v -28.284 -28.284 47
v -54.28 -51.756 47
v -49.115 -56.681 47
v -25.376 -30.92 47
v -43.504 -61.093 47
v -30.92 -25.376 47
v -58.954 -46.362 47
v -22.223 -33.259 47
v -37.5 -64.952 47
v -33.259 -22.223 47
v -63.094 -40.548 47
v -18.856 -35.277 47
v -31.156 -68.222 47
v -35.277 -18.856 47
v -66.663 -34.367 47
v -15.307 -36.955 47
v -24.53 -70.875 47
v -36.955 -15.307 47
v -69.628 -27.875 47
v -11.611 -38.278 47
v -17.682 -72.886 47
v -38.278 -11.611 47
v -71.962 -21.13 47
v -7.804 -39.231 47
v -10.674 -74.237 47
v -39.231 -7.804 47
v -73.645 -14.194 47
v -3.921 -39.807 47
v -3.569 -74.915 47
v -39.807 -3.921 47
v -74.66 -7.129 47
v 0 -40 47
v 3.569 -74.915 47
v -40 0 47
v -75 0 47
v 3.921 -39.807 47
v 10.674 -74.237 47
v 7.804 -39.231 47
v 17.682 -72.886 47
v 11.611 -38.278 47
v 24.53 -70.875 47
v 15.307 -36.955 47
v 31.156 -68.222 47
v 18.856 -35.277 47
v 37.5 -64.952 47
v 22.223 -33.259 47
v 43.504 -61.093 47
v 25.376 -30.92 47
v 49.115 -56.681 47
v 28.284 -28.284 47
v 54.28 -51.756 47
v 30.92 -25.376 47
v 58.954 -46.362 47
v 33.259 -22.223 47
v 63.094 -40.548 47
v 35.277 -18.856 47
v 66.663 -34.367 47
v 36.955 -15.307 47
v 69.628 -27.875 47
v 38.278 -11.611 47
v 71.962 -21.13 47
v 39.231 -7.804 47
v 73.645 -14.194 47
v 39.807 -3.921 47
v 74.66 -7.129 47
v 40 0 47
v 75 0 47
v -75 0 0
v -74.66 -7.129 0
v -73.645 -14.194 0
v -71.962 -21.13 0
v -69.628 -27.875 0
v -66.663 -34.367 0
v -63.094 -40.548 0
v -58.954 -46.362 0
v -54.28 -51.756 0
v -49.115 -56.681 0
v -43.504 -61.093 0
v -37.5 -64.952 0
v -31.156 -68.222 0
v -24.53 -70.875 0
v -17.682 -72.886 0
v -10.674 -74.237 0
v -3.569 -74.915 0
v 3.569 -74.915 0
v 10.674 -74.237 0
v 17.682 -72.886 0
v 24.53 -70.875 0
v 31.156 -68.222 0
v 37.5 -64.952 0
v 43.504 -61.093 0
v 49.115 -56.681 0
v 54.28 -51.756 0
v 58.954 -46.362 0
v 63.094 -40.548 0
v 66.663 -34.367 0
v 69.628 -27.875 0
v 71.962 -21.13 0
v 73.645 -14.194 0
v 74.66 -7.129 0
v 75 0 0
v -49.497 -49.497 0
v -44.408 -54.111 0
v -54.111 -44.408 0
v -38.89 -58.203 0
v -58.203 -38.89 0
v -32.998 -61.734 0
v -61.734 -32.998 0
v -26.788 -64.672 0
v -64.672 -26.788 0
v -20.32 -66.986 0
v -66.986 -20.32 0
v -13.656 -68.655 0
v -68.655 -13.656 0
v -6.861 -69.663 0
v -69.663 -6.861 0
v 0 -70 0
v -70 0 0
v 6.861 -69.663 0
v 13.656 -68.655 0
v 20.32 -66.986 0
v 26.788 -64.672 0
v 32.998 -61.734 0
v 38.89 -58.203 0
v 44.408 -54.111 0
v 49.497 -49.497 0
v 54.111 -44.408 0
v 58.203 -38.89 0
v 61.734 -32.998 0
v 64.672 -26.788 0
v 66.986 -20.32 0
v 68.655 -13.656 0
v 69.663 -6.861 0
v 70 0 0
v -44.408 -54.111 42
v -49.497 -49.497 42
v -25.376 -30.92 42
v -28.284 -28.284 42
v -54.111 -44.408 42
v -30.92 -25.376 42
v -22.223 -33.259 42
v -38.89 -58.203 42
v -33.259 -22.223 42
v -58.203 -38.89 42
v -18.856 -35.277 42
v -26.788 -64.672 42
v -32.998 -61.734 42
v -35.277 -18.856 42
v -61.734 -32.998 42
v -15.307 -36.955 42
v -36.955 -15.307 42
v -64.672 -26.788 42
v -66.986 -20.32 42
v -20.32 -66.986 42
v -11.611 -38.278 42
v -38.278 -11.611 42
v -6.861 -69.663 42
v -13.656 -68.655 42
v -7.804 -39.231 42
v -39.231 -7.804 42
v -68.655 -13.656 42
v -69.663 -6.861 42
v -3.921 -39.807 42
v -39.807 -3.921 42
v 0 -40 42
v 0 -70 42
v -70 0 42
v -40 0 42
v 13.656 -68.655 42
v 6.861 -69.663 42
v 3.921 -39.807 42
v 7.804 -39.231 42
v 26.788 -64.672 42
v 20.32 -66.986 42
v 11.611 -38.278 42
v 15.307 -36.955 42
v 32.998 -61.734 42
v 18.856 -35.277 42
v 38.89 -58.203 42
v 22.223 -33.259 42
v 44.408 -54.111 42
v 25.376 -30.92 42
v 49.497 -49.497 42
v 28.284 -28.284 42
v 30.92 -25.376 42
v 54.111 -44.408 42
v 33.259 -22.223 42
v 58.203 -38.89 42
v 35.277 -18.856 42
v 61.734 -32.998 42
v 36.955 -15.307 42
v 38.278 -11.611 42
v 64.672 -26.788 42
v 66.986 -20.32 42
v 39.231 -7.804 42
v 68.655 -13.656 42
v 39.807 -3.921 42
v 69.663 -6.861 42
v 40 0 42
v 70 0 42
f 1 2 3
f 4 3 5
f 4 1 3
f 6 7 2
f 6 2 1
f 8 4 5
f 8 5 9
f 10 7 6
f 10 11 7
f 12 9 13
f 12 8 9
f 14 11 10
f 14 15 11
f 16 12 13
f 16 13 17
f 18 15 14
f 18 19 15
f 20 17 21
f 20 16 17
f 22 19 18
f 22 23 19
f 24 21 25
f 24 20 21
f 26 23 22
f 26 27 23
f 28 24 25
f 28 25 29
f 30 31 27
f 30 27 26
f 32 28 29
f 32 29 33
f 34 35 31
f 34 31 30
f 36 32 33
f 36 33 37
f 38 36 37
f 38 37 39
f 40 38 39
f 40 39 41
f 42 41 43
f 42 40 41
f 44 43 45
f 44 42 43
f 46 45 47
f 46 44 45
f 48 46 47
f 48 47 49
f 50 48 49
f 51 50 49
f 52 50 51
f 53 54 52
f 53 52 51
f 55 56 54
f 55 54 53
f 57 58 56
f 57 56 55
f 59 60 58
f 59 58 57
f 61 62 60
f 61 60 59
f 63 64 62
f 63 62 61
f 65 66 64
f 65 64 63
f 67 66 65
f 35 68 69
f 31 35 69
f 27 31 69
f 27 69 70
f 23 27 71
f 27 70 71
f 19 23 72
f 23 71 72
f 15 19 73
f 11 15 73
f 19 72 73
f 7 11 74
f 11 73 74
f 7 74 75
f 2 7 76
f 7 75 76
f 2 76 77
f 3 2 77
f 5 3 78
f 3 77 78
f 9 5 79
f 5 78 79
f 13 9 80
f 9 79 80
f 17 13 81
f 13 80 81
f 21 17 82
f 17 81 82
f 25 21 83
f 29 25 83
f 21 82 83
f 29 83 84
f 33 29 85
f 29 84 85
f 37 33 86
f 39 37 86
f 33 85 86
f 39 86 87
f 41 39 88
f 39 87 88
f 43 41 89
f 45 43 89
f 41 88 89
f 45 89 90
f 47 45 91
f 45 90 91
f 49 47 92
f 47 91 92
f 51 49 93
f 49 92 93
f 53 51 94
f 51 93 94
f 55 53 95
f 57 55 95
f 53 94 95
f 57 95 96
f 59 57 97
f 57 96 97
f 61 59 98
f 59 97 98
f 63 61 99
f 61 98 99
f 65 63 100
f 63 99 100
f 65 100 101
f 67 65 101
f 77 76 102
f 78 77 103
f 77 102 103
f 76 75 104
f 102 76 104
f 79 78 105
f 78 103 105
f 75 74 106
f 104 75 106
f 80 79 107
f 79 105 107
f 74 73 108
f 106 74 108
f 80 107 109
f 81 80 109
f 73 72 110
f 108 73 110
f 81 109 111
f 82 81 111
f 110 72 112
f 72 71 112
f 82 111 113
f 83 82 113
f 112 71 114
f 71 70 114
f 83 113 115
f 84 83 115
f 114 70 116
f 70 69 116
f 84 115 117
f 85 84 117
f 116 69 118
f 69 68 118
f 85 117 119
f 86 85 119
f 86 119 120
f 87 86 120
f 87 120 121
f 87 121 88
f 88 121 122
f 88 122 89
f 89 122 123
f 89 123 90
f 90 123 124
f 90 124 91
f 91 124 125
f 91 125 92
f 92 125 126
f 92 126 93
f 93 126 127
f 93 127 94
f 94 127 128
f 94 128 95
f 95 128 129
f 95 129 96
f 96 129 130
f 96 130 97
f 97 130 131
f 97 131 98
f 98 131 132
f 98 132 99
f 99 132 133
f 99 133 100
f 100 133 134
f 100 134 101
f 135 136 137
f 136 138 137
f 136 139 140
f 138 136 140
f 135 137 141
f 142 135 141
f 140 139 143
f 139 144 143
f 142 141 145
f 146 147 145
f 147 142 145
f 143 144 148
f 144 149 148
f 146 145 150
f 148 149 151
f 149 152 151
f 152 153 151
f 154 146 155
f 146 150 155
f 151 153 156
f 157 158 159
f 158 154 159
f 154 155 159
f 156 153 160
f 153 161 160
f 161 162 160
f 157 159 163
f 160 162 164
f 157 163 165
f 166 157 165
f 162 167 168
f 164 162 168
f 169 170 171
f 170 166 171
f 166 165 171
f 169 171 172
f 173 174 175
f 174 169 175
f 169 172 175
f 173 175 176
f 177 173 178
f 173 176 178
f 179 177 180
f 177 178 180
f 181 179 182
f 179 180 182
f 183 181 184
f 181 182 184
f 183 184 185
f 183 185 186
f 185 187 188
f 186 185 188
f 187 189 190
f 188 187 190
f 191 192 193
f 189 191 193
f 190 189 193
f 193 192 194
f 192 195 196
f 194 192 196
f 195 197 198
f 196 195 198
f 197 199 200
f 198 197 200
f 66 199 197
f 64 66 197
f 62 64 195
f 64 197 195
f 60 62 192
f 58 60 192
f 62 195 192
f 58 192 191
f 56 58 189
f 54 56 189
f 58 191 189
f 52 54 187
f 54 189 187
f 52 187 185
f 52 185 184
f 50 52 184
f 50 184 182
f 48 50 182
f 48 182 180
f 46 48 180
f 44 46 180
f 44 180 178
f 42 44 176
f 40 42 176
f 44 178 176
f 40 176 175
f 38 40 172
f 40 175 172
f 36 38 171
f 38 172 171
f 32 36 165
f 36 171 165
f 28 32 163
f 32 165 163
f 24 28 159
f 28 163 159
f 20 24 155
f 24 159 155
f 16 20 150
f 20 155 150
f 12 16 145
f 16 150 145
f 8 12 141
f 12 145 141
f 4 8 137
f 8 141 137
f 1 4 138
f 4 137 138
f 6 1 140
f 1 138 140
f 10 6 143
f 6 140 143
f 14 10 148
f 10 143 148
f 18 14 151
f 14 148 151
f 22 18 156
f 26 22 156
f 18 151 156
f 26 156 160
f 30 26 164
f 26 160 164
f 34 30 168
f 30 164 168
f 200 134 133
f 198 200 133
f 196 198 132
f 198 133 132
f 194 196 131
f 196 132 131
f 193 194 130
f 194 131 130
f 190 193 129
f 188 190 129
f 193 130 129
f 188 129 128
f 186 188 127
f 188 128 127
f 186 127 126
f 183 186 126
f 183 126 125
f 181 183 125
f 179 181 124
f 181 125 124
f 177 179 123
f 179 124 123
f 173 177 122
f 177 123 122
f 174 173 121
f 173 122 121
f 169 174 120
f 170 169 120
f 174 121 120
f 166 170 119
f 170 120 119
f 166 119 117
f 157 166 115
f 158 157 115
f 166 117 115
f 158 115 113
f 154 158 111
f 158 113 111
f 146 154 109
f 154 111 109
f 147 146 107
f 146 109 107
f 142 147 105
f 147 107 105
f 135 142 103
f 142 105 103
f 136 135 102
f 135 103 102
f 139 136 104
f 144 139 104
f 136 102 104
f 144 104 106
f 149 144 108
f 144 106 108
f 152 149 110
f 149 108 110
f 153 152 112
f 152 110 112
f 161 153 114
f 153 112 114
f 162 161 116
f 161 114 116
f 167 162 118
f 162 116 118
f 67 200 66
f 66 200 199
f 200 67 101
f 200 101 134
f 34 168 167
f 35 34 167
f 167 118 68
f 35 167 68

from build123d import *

# Parameters (mm, degrees)
BOSS_EXTRUDE1_DEPTH = 42
BOSS_EXTRUDE2_DEPTH = 5


with BuildPart() as part:
    # Sketch1 → Boss-Extrude1 (new body)
    with BuildSketch(Plane.XY):
        with BuildLine():
            Line((75, 0), (70, 0))
            ThreePointArc((70, 0), (0, -70), (-70, 0))
            Line((-70, 0), (-75, 0))
            ThreePointArc((-75, 0), (0, -75), (75, 0))
        make_face()
    extrude(amount=BOSS_EXTRUDE1_DEPTH)

    # Sketch2 → Boss-Extrude2 (add)
    with BuildSketch(Plane.XY.offset(42)):
        with BuildLine():
            Line((75, 0), (70, 0))
            ThreePointArc((70, 0), (0, -70), (-70, 0))
            Line((-70, 0), (-75, 0))
            ThreePointArc((-75, 0), (0, -75), (75, 0))
        make_face()
        with BuildLine():
            Line((-40, 0), (-70, 0))
            ThreePointArc((-70, 0), (0, -70), (70, 0))
            Line((70, 0), (40, 0))
            ThreePointArc((40, 0), (0, -40), (-40, 0))
        make_face()
    extrude(amount=BOSS_EXTRUDE2_DEPTH)


solid = part.part
